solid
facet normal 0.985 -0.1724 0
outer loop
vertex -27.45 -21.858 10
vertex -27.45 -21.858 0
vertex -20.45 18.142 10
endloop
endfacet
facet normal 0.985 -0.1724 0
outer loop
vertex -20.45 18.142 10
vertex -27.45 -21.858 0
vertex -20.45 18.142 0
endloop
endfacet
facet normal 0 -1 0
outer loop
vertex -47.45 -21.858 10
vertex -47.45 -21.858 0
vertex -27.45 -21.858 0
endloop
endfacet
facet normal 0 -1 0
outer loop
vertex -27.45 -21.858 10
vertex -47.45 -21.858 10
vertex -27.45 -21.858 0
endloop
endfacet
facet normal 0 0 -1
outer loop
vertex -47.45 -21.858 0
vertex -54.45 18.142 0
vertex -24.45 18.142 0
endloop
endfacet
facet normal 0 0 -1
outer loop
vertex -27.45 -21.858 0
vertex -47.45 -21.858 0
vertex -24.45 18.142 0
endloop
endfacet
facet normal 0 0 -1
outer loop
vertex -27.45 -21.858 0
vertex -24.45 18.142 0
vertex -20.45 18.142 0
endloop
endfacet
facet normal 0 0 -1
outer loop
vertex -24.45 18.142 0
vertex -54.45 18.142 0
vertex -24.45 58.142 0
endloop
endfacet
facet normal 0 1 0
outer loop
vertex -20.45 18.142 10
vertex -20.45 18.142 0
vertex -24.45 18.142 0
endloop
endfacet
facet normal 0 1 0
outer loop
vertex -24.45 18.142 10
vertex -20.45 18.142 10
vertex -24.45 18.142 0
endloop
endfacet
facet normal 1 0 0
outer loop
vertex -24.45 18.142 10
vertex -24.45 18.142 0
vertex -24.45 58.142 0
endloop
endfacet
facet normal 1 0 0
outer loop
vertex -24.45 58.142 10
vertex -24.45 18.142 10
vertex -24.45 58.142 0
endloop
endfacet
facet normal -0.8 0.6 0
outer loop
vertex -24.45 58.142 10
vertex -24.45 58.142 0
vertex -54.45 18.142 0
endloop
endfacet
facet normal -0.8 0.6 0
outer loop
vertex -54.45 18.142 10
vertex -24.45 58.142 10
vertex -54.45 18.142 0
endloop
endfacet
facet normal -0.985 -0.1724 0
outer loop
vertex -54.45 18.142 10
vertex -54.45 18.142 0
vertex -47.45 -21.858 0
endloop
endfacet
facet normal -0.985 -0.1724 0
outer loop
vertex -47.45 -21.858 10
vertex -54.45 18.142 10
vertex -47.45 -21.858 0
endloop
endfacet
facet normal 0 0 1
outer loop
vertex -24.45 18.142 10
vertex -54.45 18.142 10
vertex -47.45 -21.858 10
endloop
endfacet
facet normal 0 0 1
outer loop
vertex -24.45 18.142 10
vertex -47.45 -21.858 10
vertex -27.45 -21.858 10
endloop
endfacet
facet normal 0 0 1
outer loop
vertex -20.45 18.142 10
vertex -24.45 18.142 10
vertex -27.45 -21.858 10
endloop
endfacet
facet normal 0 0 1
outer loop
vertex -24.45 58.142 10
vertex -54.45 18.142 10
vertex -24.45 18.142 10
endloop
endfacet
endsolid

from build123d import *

# Parameters (mm, degrees)
F1_DEPTH = 10


with BuildPart() as f1:
    # F0 (on Top) → F1 (new body)
    with BuildSketch(Plane.XY):
        Polygon((-24.450092, 18.142014), (-54.450092, 18.142014), (-47.450092, -21.857986), (-27.450092, -21.857986), (-20.450092, 18.142014), align=None)
        Polygon((-24.450092, 58.142014), (-54.450092, 18.142014), (-24.450092, 18.142014), align=None)
    extrude(amount=F1_DEPTH)


solid = f1.part
